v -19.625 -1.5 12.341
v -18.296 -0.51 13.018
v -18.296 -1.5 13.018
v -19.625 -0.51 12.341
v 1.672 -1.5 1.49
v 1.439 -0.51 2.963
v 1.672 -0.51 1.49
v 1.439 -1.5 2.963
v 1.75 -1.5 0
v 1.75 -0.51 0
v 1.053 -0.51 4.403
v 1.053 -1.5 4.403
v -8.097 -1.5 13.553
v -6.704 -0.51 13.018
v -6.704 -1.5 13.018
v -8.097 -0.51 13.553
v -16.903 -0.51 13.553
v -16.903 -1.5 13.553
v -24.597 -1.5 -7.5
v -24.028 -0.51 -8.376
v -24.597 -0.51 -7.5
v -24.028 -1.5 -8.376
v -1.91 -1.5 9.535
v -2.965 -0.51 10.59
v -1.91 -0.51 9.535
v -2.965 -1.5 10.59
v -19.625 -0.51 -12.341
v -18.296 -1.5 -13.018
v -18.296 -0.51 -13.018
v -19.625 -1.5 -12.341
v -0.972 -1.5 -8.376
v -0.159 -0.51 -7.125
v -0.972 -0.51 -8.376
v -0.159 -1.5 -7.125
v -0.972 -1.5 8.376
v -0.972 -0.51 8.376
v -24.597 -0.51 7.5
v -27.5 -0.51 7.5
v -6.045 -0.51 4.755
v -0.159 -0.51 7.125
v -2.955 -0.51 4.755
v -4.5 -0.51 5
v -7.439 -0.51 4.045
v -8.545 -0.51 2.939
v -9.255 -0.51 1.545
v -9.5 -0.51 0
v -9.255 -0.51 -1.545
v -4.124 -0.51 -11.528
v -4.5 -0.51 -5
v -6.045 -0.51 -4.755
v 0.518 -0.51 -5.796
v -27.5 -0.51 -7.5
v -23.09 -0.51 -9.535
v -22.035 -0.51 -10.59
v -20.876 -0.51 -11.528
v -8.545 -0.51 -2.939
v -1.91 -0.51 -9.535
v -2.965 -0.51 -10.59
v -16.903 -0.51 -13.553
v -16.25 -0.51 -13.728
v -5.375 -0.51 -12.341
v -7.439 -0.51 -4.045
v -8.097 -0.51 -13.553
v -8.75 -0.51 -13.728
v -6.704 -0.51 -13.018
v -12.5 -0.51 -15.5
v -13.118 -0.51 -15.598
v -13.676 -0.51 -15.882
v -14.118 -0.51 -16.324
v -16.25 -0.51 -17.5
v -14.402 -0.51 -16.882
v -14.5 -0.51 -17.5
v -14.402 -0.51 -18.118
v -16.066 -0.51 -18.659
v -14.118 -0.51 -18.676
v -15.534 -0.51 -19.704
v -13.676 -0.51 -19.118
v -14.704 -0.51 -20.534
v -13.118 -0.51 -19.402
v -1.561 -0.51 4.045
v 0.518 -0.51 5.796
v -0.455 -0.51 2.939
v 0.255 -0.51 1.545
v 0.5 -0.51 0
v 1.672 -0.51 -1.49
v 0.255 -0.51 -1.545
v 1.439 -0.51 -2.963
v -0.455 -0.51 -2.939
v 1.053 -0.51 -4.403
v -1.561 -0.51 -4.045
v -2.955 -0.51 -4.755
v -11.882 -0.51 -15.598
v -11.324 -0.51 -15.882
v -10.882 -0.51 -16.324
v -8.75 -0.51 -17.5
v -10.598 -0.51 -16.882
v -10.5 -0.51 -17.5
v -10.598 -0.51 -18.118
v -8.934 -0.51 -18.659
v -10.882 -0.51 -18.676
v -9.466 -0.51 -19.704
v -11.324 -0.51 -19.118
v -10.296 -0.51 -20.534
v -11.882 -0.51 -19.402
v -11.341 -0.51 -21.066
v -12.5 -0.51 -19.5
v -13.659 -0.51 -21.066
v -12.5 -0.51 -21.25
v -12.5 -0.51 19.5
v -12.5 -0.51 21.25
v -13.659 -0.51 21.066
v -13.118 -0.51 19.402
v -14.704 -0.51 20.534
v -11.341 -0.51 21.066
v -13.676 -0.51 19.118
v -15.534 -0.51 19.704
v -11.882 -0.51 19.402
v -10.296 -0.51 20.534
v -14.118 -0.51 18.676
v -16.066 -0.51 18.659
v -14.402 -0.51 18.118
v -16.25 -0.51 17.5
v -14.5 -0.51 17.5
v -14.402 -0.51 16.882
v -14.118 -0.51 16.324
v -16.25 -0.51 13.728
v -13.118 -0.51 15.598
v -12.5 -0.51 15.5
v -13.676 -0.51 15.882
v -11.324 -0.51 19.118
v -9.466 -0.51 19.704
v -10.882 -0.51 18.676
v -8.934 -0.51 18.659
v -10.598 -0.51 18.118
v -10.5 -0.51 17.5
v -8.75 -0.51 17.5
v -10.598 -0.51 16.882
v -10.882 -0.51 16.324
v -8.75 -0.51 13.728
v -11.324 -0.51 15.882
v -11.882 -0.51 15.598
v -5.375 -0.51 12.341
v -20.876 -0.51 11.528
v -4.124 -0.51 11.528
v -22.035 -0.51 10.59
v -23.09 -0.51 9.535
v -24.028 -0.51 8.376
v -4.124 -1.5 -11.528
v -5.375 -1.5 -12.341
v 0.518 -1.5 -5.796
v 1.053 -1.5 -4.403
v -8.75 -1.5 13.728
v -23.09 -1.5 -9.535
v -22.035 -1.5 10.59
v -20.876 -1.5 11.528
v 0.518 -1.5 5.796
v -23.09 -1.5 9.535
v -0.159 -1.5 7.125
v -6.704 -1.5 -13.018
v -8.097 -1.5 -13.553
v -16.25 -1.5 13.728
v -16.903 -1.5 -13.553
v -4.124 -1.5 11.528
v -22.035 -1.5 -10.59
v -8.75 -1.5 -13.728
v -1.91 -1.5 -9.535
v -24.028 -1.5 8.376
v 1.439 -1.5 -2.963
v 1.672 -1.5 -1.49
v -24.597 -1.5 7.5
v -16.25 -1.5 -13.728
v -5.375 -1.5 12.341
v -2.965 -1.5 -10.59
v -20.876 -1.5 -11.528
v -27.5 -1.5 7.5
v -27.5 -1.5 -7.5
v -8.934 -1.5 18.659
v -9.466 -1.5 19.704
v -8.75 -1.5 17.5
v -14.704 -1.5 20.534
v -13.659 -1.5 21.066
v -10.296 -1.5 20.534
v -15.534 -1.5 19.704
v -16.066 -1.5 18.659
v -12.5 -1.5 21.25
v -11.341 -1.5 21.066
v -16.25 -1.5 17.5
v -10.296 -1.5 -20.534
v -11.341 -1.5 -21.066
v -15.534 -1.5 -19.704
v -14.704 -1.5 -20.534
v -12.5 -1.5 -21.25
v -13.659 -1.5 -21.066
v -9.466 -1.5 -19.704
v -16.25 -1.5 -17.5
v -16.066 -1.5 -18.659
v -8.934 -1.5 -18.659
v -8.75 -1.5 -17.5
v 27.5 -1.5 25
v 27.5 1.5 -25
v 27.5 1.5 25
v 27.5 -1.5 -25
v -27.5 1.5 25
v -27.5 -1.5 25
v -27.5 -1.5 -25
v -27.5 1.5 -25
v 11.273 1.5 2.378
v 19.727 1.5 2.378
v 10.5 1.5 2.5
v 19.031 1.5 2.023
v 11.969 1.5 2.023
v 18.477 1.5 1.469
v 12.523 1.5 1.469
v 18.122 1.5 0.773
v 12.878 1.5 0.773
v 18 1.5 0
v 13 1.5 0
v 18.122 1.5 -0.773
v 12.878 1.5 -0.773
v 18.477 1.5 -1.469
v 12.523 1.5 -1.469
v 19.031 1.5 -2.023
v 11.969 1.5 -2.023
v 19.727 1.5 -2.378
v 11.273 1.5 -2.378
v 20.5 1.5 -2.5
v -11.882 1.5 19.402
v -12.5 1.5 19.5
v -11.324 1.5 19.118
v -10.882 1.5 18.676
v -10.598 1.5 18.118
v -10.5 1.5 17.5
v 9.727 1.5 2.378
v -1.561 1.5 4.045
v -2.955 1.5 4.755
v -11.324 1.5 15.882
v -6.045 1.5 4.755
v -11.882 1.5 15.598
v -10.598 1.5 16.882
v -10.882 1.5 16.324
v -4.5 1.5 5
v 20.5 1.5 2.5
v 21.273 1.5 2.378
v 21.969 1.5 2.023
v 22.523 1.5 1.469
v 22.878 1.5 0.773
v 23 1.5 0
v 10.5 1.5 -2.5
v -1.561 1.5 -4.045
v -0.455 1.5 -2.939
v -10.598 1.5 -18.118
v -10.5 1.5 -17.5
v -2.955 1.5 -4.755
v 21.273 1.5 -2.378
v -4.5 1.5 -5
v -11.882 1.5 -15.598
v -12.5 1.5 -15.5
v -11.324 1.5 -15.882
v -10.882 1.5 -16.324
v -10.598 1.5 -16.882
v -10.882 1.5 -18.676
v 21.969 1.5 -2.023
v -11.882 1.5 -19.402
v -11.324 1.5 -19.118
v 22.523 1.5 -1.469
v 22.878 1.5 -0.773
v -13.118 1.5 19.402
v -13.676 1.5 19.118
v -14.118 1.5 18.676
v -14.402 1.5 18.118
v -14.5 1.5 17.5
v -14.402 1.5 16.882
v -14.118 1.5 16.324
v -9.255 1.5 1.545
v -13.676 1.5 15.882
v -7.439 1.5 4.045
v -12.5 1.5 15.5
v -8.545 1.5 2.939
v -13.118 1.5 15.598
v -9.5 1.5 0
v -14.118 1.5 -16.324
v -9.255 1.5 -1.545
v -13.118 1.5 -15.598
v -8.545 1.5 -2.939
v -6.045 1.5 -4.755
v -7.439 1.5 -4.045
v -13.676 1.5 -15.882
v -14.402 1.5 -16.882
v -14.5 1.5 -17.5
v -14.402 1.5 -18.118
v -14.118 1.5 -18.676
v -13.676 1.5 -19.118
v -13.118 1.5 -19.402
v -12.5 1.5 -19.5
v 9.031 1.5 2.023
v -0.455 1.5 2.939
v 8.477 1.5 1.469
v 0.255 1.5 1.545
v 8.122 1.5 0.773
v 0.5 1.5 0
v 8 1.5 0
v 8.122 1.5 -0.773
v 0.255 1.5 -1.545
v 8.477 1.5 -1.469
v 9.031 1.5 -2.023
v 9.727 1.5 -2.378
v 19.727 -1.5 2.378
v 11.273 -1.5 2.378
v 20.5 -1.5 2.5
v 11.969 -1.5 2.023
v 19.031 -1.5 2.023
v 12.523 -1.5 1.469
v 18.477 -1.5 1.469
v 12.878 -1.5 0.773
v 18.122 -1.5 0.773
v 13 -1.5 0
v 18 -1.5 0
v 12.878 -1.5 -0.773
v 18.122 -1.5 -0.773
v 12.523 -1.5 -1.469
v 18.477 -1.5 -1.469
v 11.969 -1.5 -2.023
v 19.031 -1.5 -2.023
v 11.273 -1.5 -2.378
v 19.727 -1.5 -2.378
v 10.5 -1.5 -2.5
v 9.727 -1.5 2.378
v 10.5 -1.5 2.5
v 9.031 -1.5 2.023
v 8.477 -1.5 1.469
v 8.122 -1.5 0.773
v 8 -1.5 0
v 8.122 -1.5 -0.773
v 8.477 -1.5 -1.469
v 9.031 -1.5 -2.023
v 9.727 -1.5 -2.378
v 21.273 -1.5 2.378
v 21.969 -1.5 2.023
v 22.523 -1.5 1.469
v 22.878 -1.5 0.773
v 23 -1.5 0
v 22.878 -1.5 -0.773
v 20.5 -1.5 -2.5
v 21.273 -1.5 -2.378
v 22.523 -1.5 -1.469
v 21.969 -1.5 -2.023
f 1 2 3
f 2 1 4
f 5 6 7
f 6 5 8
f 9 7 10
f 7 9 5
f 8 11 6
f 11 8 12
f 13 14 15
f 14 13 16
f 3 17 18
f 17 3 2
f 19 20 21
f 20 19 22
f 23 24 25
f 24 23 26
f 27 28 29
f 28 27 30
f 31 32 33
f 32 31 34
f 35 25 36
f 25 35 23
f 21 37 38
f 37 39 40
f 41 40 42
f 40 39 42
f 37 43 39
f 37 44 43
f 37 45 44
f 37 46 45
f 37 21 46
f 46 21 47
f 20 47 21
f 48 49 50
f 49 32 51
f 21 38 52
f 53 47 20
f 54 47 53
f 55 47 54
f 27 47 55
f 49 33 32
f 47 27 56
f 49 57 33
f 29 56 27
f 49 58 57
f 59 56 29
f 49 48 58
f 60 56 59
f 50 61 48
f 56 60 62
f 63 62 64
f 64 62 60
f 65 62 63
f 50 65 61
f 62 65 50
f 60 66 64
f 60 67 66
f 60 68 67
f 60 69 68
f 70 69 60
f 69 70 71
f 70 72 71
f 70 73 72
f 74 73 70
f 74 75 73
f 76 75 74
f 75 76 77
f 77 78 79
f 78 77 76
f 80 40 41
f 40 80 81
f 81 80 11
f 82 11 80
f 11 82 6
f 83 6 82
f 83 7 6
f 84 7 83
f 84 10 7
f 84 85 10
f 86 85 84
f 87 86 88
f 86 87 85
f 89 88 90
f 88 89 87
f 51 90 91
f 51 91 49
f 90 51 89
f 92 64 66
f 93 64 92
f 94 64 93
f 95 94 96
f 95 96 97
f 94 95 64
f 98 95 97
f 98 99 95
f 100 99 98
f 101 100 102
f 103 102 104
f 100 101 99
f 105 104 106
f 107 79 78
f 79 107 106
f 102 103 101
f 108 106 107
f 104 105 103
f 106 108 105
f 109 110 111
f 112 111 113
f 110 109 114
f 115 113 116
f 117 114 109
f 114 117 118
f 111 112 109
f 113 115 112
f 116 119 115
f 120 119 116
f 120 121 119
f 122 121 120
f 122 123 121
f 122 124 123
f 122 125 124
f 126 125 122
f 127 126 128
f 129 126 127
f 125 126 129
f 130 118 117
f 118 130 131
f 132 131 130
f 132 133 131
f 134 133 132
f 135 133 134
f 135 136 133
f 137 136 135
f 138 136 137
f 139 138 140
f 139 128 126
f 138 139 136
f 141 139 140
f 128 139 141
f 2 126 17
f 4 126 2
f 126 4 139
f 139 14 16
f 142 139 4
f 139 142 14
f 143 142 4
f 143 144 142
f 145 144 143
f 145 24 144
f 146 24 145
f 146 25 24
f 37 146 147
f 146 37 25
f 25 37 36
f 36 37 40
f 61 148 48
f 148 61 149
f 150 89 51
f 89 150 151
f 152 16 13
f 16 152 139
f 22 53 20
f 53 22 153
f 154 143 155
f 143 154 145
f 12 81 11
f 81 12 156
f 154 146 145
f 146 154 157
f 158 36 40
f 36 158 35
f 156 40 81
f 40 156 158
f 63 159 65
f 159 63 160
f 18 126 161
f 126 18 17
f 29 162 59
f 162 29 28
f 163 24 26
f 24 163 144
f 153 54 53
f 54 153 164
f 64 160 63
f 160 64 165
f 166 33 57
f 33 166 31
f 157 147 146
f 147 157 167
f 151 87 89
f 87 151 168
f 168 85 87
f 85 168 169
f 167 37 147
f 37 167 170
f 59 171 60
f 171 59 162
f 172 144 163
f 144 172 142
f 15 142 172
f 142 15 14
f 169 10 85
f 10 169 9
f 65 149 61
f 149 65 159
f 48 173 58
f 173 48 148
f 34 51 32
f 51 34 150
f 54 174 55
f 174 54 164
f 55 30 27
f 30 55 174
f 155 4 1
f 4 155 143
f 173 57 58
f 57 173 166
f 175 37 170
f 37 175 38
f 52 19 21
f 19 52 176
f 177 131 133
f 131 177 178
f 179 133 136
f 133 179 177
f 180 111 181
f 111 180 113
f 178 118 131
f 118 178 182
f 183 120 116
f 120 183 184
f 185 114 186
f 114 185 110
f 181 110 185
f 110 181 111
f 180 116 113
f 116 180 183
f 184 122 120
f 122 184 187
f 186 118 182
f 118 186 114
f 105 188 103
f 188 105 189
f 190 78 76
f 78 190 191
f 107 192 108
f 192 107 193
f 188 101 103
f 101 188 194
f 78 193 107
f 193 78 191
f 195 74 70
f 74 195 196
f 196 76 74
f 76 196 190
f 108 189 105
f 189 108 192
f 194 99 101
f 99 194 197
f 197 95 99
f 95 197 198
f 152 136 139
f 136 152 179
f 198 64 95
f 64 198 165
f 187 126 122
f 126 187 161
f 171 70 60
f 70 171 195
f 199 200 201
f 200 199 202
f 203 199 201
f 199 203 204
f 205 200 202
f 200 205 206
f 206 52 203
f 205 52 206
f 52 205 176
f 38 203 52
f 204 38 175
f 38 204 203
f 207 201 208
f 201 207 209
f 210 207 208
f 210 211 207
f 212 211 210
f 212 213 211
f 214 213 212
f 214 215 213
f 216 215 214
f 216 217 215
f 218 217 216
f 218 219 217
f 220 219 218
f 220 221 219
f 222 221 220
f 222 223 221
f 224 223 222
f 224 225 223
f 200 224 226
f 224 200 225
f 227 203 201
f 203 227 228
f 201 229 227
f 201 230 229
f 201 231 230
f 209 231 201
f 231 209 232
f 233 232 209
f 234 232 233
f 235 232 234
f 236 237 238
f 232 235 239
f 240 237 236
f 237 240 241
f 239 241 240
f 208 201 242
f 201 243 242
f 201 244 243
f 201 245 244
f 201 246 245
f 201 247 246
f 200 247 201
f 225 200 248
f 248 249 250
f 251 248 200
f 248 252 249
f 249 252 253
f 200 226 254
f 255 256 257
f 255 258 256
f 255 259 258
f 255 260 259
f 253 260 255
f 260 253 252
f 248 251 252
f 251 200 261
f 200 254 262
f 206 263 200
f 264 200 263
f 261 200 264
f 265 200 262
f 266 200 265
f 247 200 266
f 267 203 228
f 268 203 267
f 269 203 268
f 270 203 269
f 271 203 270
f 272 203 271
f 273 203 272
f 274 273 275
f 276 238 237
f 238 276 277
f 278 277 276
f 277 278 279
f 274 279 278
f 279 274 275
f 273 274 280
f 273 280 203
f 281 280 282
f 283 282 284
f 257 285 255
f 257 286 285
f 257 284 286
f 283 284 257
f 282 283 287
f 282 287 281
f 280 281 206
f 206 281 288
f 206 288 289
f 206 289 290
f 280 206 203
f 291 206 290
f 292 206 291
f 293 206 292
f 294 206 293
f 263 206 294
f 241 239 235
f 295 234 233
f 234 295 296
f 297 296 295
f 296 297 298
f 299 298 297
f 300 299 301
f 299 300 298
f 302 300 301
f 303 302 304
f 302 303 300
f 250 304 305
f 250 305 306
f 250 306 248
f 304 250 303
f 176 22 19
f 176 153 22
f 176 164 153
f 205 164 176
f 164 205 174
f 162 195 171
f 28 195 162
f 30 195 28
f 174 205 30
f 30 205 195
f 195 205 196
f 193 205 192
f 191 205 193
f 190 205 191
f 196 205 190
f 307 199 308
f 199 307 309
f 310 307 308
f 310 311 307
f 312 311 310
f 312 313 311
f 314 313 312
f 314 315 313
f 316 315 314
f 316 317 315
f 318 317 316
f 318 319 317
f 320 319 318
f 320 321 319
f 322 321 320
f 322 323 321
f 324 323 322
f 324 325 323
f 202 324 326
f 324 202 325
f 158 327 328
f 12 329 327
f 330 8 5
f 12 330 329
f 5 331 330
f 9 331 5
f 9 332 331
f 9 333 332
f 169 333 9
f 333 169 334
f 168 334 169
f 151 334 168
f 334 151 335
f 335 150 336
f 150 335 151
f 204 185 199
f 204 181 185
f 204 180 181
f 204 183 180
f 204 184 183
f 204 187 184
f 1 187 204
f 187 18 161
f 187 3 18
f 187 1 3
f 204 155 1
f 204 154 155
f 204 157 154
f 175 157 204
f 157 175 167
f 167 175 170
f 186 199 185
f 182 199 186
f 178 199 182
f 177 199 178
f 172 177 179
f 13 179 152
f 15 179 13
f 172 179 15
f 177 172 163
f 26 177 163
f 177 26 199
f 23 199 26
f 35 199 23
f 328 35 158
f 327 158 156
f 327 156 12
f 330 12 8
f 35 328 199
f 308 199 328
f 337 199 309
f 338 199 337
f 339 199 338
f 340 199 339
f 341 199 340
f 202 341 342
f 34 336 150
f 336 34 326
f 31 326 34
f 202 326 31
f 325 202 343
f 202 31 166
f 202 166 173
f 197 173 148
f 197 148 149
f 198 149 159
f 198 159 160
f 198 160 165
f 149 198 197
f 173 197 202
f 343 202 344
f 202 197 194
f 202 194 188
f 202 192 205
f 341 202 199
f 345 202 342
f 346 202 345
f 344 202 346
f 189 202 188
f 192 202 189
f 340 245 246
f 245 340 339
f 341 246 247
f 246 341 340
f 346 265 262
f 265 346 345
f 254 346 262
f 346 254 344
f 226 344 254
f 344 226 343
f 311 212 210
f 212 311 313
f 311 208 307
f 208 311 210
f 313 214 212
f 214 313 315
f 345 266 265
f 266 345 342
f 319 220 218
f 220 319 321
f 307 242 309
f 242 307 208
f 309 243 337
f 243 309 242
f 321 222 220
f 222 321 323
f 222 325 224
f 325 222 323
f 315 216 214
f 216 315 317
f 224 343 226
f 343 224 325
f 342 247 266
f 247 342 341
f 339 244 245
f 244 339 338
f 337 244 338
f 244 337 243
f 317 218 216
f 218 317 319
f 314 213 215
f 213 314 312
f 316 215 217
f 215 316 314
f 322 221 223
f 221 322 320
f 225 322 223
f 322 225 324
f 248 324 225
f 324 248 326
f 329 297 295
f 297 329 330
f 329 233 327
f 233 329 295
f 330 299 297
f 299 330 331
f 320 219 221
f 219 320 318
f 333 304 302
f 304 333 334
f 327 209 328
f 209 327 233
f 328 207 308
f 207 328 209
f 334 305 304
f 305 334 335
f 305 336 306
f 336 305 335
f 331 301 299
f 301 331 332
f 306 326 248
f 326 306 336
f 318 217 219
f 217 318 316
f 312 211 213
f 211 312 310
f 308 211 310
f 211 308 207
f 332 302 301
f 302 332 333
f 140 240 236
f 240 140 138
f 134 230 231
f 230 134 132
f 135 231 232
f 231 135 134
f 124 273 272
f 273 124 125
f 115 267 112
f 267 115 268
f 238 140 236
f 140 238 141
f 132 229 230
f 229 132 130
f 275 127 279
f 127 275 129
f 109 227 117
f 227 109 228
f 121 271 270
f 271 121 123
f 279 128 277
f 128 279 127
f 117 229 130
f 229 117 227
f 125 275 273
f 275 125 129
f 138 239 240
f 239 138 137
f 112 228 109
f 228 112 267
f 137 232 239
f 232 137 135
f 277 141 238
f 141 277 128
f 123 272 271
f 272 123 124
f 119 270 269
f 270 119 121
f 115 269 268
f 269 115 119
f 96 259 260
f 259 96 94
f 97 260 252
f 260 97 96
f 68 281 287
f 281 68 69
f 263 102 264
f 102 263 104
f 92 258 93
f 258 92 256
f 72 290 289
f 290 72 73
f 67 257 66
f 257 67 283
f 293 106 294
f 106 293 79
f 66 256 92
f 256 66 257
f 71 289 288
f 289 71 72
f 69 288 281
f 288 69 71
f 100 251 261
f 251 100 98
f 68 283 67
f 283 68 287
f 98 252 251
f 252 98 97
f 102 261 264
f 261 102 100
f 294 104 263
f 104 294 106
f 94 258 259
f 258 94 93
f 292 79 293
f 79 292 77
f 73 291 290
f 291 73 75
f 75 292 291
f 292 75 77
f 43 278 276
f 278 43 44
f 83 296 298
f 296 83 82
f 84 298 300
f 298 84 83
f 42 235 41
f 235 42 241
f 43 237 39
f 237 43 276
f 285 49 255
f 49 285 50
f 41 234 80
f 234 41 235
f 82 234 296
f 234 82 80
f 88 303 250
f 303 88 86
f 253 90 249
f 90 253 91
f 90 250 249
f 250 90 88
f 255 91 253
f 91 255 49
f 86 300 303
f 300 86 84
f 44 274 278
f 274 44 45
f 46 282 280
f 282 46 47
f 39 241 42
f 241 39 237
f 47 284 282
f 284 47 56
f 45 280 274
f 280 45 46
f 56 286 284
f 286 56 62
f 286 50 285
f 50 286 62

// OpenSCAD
// Fixation d'un moteur 28BYJ-48 sur une barre V-slot 20x20 

// bar
bar_y = 20;
bar_z = 20;
// petite barre de guidage
y_width_hole = 2 ;
z_width_hole = 5.5 ;

// pm : pooley_mount
pm_x = 55; 
pm_y = 3;
pm_z = 50;


module bar_20x20(){
    %cube([100, 20, 20], center = true);
};
    
module hole_m5(){
    rotate([90, 0, 0]) cylinder(h=20, r=mp_hole1_r, center = true, $fn=20);
}

module hole_m4(){
    rotate([90, 0, 0]) cylinder(h=20, r=2, center = true, $fn=20);
}

// pour fixer la monture, 2 trous de m5 distants de 10 mm.
mp_hole1_r = 5/2 ;
pm_hole1_d1 = 2 + 5;
pm_hole1_d2 = pm_hole1_d1 + 10;

module mount(){
    pm_hole2_d = 40 ; // distance de percage des trous tenant le moteur / bord droit de la mouture
    pm_hole2_distance = 35; // écart entre les trous tenant le moteur
    pm_hole2_r = 4/2;
    // motor
m_dist_to_shaft = 8 ; //
m_shaft_hole_r = 10 /2;
m_radius = (28 + 0.5) / 2; // diamètre général pour la découpe
m_pattes_defixation = 7 + 0.5;
m_profondeur = 1 ; // profondeur de la découpe pour loguer le moteur 
    
    difference(){
        // le bloc principal
        union(){
        //translate ([0, -(bar_y + pm_y)/2, 0 ])  
        cube([pm_x, pm_y, pm_z], center =true );
        
        // on ajoute une petite barre pour mieux aligner la fixation
        // translate([(pm_x-22)/2, (pm_y + y_width_hole)/2, 0])
        // cube([22, y_width_hole, z_width_hole], center = true);
        }
    // trous de fixation sur le rail
    translate ([(pm_x) /2 - pm_hole1_d1, 0, 0]) hole_m5();
    translate ([(pm_x) /2 - pm_hole1_d2, 0, 0]) hole_m5();
    // trous de fixation du moteur par 2 boulons de m4
    translate ([(pm_x) /2 - pm_hole2_d, 0, pm_hole2_distance/2]) hole_m4();
    translate ([(pm_x) /2 - pm_hole2_d, 0, -pm_hole2_distance/2]) hole_m4();
    
    // trou pour axe moteur
    translate([(pm_x/2 - pm_hole2_d + m_dist_to_shaft) ,0,  0])
    rotate([90, 0, 0]) cylinder(h=20, r=m_shaft_hole_r, center = true, $fn=20 );
    
        
    // découpe pour mieux fixer
    // un grand rond  et     // un échappement pour les fils
    d_x = 15    ; 
    d_z = 15 ;
        
    translate([(pm_x) /2 - pm_hole2_d,-(pm_y- m_profondeur)/2-0.01,0]){
        rotate([90, 0, 0]) cylinder(h=m_profondeur, r=m_radius, center = true, $fn=60);
        // zone d'échappement des fils
        translate([-20, -d_x + m_profondeur/2, -d_z/2])
        cube([d_x,d_x,d_z]);   
        // 2 petits cylindre pour loguer les pattes
        translate([0, 0, pm_hole2_distance/2])
        rotate([90, 0, 0]) cylinder(h=m_profondeur, r=m_pattes_defixation/2, center = true, $fn=20 );
        translate([0, 0, -pm_hole2_distance/2])
        rotate([90, 0, 0]) cylinder(h=m_profondeur, r=m_pattes_defixation/2, center = true, $fn=20 );
        // un petit cube pour les pattes
        translate([-m_pattes_defixation/2, -m_profondeur/2, -pm_hole2_distance/2])
      //  color("purple", 0.5) 
        cube([m_pattes_defixation,m_profondeur, pm_hole2_distance]);
        }
    }; // end of diff
};

// On trace la bar
translate([-0, -0,-0]) 

bar_20x20();

// module de fixation
//translate([0,-(bar_y+pm_y)/2, 0])
mount();
